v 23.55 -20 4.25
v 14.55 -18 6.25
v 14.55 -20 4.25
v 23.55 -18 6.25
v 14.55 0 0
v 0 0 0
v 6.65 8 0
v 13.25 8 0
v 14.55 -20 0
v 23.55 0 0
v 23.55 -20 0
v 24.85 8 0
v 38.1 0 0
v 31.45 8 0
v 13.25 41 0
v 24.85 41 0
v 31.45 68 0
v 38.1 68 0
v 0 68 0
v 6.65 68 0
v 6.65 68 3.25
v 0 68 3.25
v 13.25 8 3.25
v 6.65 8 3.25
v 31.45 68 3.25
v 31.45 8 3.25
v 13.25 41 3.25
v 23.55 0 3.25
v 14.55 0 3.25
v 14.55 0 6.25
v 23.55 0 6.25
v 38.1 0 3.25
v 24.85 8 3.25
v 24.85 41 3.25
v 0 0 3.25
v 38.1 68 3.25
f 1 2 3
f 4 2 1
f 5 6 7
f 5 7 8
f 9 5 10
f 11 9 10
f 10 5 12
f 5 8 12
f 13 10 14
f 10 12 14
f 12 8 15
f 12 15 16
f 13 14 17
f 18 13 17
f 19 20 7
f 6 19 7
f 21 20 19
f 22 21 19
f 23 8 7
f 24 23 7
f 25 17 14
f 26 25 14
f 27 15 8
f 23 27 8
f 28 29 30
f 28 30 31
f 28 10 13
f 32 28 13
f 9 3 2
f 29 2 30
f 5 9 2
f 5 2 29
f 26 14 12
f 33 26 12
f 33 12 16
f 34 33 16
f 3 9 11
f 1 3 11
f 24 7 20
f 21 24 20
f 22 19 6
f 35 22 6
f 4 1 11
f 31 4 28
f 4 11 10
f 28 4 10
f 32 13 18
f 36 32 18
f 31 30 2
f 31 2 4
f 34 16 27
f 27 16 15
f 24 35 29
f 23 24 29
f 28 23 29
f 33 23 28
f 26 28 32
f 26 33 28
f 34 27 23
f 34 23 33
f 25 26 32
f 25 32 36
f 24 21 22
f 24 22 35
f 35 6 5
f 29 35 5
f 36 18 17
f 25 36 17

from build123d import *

# Parameters (mm, degrees)
PAD_DEPTH    = 3.25
SKETCH001_W  = 9
SKETCH001_H  = 20
PAD001_DEPTH = 3
CHAMFER_SIZE = 2


with BuildPart() as part:
    # Sketch → Pad (new body)
    with BuildSketch(Plane.XY):
        Polygon((38.1, 0), (38.1, 8), (38.1, 68), (31.45, 68), (31.45, 8), (24.85, 8), (24.85, 41), (13.25, 41), (13.25, 8), (6.65, 8), (6.65, 68), (0, 68), (0, 8), (0, 0), (14.55, 0), (14.55, -20), (23.55, -20), (23.55, 0), align=None)
    extrude(amount=PAD_DEPTH)

    # Sketch001 (on Face20 of Pad) → Pad001 (join)
    with BuildSketch(Plane.XY.offset(3.25)):
        with Locations((19.05, -10)):
            Rectangle(SKETCH001_W, SKETCH001_H)
    extrude(amount=PAD001_DEPTH)

    # Chamfer
    chamfer_edges = [part.edges().sort_by_distance(p)[0] for p in [
        (19.05, -20, 6.25),
    ]]
    chamfer(chamfer_edges, length=CHAMFER_SIZE)


solid = part.part
